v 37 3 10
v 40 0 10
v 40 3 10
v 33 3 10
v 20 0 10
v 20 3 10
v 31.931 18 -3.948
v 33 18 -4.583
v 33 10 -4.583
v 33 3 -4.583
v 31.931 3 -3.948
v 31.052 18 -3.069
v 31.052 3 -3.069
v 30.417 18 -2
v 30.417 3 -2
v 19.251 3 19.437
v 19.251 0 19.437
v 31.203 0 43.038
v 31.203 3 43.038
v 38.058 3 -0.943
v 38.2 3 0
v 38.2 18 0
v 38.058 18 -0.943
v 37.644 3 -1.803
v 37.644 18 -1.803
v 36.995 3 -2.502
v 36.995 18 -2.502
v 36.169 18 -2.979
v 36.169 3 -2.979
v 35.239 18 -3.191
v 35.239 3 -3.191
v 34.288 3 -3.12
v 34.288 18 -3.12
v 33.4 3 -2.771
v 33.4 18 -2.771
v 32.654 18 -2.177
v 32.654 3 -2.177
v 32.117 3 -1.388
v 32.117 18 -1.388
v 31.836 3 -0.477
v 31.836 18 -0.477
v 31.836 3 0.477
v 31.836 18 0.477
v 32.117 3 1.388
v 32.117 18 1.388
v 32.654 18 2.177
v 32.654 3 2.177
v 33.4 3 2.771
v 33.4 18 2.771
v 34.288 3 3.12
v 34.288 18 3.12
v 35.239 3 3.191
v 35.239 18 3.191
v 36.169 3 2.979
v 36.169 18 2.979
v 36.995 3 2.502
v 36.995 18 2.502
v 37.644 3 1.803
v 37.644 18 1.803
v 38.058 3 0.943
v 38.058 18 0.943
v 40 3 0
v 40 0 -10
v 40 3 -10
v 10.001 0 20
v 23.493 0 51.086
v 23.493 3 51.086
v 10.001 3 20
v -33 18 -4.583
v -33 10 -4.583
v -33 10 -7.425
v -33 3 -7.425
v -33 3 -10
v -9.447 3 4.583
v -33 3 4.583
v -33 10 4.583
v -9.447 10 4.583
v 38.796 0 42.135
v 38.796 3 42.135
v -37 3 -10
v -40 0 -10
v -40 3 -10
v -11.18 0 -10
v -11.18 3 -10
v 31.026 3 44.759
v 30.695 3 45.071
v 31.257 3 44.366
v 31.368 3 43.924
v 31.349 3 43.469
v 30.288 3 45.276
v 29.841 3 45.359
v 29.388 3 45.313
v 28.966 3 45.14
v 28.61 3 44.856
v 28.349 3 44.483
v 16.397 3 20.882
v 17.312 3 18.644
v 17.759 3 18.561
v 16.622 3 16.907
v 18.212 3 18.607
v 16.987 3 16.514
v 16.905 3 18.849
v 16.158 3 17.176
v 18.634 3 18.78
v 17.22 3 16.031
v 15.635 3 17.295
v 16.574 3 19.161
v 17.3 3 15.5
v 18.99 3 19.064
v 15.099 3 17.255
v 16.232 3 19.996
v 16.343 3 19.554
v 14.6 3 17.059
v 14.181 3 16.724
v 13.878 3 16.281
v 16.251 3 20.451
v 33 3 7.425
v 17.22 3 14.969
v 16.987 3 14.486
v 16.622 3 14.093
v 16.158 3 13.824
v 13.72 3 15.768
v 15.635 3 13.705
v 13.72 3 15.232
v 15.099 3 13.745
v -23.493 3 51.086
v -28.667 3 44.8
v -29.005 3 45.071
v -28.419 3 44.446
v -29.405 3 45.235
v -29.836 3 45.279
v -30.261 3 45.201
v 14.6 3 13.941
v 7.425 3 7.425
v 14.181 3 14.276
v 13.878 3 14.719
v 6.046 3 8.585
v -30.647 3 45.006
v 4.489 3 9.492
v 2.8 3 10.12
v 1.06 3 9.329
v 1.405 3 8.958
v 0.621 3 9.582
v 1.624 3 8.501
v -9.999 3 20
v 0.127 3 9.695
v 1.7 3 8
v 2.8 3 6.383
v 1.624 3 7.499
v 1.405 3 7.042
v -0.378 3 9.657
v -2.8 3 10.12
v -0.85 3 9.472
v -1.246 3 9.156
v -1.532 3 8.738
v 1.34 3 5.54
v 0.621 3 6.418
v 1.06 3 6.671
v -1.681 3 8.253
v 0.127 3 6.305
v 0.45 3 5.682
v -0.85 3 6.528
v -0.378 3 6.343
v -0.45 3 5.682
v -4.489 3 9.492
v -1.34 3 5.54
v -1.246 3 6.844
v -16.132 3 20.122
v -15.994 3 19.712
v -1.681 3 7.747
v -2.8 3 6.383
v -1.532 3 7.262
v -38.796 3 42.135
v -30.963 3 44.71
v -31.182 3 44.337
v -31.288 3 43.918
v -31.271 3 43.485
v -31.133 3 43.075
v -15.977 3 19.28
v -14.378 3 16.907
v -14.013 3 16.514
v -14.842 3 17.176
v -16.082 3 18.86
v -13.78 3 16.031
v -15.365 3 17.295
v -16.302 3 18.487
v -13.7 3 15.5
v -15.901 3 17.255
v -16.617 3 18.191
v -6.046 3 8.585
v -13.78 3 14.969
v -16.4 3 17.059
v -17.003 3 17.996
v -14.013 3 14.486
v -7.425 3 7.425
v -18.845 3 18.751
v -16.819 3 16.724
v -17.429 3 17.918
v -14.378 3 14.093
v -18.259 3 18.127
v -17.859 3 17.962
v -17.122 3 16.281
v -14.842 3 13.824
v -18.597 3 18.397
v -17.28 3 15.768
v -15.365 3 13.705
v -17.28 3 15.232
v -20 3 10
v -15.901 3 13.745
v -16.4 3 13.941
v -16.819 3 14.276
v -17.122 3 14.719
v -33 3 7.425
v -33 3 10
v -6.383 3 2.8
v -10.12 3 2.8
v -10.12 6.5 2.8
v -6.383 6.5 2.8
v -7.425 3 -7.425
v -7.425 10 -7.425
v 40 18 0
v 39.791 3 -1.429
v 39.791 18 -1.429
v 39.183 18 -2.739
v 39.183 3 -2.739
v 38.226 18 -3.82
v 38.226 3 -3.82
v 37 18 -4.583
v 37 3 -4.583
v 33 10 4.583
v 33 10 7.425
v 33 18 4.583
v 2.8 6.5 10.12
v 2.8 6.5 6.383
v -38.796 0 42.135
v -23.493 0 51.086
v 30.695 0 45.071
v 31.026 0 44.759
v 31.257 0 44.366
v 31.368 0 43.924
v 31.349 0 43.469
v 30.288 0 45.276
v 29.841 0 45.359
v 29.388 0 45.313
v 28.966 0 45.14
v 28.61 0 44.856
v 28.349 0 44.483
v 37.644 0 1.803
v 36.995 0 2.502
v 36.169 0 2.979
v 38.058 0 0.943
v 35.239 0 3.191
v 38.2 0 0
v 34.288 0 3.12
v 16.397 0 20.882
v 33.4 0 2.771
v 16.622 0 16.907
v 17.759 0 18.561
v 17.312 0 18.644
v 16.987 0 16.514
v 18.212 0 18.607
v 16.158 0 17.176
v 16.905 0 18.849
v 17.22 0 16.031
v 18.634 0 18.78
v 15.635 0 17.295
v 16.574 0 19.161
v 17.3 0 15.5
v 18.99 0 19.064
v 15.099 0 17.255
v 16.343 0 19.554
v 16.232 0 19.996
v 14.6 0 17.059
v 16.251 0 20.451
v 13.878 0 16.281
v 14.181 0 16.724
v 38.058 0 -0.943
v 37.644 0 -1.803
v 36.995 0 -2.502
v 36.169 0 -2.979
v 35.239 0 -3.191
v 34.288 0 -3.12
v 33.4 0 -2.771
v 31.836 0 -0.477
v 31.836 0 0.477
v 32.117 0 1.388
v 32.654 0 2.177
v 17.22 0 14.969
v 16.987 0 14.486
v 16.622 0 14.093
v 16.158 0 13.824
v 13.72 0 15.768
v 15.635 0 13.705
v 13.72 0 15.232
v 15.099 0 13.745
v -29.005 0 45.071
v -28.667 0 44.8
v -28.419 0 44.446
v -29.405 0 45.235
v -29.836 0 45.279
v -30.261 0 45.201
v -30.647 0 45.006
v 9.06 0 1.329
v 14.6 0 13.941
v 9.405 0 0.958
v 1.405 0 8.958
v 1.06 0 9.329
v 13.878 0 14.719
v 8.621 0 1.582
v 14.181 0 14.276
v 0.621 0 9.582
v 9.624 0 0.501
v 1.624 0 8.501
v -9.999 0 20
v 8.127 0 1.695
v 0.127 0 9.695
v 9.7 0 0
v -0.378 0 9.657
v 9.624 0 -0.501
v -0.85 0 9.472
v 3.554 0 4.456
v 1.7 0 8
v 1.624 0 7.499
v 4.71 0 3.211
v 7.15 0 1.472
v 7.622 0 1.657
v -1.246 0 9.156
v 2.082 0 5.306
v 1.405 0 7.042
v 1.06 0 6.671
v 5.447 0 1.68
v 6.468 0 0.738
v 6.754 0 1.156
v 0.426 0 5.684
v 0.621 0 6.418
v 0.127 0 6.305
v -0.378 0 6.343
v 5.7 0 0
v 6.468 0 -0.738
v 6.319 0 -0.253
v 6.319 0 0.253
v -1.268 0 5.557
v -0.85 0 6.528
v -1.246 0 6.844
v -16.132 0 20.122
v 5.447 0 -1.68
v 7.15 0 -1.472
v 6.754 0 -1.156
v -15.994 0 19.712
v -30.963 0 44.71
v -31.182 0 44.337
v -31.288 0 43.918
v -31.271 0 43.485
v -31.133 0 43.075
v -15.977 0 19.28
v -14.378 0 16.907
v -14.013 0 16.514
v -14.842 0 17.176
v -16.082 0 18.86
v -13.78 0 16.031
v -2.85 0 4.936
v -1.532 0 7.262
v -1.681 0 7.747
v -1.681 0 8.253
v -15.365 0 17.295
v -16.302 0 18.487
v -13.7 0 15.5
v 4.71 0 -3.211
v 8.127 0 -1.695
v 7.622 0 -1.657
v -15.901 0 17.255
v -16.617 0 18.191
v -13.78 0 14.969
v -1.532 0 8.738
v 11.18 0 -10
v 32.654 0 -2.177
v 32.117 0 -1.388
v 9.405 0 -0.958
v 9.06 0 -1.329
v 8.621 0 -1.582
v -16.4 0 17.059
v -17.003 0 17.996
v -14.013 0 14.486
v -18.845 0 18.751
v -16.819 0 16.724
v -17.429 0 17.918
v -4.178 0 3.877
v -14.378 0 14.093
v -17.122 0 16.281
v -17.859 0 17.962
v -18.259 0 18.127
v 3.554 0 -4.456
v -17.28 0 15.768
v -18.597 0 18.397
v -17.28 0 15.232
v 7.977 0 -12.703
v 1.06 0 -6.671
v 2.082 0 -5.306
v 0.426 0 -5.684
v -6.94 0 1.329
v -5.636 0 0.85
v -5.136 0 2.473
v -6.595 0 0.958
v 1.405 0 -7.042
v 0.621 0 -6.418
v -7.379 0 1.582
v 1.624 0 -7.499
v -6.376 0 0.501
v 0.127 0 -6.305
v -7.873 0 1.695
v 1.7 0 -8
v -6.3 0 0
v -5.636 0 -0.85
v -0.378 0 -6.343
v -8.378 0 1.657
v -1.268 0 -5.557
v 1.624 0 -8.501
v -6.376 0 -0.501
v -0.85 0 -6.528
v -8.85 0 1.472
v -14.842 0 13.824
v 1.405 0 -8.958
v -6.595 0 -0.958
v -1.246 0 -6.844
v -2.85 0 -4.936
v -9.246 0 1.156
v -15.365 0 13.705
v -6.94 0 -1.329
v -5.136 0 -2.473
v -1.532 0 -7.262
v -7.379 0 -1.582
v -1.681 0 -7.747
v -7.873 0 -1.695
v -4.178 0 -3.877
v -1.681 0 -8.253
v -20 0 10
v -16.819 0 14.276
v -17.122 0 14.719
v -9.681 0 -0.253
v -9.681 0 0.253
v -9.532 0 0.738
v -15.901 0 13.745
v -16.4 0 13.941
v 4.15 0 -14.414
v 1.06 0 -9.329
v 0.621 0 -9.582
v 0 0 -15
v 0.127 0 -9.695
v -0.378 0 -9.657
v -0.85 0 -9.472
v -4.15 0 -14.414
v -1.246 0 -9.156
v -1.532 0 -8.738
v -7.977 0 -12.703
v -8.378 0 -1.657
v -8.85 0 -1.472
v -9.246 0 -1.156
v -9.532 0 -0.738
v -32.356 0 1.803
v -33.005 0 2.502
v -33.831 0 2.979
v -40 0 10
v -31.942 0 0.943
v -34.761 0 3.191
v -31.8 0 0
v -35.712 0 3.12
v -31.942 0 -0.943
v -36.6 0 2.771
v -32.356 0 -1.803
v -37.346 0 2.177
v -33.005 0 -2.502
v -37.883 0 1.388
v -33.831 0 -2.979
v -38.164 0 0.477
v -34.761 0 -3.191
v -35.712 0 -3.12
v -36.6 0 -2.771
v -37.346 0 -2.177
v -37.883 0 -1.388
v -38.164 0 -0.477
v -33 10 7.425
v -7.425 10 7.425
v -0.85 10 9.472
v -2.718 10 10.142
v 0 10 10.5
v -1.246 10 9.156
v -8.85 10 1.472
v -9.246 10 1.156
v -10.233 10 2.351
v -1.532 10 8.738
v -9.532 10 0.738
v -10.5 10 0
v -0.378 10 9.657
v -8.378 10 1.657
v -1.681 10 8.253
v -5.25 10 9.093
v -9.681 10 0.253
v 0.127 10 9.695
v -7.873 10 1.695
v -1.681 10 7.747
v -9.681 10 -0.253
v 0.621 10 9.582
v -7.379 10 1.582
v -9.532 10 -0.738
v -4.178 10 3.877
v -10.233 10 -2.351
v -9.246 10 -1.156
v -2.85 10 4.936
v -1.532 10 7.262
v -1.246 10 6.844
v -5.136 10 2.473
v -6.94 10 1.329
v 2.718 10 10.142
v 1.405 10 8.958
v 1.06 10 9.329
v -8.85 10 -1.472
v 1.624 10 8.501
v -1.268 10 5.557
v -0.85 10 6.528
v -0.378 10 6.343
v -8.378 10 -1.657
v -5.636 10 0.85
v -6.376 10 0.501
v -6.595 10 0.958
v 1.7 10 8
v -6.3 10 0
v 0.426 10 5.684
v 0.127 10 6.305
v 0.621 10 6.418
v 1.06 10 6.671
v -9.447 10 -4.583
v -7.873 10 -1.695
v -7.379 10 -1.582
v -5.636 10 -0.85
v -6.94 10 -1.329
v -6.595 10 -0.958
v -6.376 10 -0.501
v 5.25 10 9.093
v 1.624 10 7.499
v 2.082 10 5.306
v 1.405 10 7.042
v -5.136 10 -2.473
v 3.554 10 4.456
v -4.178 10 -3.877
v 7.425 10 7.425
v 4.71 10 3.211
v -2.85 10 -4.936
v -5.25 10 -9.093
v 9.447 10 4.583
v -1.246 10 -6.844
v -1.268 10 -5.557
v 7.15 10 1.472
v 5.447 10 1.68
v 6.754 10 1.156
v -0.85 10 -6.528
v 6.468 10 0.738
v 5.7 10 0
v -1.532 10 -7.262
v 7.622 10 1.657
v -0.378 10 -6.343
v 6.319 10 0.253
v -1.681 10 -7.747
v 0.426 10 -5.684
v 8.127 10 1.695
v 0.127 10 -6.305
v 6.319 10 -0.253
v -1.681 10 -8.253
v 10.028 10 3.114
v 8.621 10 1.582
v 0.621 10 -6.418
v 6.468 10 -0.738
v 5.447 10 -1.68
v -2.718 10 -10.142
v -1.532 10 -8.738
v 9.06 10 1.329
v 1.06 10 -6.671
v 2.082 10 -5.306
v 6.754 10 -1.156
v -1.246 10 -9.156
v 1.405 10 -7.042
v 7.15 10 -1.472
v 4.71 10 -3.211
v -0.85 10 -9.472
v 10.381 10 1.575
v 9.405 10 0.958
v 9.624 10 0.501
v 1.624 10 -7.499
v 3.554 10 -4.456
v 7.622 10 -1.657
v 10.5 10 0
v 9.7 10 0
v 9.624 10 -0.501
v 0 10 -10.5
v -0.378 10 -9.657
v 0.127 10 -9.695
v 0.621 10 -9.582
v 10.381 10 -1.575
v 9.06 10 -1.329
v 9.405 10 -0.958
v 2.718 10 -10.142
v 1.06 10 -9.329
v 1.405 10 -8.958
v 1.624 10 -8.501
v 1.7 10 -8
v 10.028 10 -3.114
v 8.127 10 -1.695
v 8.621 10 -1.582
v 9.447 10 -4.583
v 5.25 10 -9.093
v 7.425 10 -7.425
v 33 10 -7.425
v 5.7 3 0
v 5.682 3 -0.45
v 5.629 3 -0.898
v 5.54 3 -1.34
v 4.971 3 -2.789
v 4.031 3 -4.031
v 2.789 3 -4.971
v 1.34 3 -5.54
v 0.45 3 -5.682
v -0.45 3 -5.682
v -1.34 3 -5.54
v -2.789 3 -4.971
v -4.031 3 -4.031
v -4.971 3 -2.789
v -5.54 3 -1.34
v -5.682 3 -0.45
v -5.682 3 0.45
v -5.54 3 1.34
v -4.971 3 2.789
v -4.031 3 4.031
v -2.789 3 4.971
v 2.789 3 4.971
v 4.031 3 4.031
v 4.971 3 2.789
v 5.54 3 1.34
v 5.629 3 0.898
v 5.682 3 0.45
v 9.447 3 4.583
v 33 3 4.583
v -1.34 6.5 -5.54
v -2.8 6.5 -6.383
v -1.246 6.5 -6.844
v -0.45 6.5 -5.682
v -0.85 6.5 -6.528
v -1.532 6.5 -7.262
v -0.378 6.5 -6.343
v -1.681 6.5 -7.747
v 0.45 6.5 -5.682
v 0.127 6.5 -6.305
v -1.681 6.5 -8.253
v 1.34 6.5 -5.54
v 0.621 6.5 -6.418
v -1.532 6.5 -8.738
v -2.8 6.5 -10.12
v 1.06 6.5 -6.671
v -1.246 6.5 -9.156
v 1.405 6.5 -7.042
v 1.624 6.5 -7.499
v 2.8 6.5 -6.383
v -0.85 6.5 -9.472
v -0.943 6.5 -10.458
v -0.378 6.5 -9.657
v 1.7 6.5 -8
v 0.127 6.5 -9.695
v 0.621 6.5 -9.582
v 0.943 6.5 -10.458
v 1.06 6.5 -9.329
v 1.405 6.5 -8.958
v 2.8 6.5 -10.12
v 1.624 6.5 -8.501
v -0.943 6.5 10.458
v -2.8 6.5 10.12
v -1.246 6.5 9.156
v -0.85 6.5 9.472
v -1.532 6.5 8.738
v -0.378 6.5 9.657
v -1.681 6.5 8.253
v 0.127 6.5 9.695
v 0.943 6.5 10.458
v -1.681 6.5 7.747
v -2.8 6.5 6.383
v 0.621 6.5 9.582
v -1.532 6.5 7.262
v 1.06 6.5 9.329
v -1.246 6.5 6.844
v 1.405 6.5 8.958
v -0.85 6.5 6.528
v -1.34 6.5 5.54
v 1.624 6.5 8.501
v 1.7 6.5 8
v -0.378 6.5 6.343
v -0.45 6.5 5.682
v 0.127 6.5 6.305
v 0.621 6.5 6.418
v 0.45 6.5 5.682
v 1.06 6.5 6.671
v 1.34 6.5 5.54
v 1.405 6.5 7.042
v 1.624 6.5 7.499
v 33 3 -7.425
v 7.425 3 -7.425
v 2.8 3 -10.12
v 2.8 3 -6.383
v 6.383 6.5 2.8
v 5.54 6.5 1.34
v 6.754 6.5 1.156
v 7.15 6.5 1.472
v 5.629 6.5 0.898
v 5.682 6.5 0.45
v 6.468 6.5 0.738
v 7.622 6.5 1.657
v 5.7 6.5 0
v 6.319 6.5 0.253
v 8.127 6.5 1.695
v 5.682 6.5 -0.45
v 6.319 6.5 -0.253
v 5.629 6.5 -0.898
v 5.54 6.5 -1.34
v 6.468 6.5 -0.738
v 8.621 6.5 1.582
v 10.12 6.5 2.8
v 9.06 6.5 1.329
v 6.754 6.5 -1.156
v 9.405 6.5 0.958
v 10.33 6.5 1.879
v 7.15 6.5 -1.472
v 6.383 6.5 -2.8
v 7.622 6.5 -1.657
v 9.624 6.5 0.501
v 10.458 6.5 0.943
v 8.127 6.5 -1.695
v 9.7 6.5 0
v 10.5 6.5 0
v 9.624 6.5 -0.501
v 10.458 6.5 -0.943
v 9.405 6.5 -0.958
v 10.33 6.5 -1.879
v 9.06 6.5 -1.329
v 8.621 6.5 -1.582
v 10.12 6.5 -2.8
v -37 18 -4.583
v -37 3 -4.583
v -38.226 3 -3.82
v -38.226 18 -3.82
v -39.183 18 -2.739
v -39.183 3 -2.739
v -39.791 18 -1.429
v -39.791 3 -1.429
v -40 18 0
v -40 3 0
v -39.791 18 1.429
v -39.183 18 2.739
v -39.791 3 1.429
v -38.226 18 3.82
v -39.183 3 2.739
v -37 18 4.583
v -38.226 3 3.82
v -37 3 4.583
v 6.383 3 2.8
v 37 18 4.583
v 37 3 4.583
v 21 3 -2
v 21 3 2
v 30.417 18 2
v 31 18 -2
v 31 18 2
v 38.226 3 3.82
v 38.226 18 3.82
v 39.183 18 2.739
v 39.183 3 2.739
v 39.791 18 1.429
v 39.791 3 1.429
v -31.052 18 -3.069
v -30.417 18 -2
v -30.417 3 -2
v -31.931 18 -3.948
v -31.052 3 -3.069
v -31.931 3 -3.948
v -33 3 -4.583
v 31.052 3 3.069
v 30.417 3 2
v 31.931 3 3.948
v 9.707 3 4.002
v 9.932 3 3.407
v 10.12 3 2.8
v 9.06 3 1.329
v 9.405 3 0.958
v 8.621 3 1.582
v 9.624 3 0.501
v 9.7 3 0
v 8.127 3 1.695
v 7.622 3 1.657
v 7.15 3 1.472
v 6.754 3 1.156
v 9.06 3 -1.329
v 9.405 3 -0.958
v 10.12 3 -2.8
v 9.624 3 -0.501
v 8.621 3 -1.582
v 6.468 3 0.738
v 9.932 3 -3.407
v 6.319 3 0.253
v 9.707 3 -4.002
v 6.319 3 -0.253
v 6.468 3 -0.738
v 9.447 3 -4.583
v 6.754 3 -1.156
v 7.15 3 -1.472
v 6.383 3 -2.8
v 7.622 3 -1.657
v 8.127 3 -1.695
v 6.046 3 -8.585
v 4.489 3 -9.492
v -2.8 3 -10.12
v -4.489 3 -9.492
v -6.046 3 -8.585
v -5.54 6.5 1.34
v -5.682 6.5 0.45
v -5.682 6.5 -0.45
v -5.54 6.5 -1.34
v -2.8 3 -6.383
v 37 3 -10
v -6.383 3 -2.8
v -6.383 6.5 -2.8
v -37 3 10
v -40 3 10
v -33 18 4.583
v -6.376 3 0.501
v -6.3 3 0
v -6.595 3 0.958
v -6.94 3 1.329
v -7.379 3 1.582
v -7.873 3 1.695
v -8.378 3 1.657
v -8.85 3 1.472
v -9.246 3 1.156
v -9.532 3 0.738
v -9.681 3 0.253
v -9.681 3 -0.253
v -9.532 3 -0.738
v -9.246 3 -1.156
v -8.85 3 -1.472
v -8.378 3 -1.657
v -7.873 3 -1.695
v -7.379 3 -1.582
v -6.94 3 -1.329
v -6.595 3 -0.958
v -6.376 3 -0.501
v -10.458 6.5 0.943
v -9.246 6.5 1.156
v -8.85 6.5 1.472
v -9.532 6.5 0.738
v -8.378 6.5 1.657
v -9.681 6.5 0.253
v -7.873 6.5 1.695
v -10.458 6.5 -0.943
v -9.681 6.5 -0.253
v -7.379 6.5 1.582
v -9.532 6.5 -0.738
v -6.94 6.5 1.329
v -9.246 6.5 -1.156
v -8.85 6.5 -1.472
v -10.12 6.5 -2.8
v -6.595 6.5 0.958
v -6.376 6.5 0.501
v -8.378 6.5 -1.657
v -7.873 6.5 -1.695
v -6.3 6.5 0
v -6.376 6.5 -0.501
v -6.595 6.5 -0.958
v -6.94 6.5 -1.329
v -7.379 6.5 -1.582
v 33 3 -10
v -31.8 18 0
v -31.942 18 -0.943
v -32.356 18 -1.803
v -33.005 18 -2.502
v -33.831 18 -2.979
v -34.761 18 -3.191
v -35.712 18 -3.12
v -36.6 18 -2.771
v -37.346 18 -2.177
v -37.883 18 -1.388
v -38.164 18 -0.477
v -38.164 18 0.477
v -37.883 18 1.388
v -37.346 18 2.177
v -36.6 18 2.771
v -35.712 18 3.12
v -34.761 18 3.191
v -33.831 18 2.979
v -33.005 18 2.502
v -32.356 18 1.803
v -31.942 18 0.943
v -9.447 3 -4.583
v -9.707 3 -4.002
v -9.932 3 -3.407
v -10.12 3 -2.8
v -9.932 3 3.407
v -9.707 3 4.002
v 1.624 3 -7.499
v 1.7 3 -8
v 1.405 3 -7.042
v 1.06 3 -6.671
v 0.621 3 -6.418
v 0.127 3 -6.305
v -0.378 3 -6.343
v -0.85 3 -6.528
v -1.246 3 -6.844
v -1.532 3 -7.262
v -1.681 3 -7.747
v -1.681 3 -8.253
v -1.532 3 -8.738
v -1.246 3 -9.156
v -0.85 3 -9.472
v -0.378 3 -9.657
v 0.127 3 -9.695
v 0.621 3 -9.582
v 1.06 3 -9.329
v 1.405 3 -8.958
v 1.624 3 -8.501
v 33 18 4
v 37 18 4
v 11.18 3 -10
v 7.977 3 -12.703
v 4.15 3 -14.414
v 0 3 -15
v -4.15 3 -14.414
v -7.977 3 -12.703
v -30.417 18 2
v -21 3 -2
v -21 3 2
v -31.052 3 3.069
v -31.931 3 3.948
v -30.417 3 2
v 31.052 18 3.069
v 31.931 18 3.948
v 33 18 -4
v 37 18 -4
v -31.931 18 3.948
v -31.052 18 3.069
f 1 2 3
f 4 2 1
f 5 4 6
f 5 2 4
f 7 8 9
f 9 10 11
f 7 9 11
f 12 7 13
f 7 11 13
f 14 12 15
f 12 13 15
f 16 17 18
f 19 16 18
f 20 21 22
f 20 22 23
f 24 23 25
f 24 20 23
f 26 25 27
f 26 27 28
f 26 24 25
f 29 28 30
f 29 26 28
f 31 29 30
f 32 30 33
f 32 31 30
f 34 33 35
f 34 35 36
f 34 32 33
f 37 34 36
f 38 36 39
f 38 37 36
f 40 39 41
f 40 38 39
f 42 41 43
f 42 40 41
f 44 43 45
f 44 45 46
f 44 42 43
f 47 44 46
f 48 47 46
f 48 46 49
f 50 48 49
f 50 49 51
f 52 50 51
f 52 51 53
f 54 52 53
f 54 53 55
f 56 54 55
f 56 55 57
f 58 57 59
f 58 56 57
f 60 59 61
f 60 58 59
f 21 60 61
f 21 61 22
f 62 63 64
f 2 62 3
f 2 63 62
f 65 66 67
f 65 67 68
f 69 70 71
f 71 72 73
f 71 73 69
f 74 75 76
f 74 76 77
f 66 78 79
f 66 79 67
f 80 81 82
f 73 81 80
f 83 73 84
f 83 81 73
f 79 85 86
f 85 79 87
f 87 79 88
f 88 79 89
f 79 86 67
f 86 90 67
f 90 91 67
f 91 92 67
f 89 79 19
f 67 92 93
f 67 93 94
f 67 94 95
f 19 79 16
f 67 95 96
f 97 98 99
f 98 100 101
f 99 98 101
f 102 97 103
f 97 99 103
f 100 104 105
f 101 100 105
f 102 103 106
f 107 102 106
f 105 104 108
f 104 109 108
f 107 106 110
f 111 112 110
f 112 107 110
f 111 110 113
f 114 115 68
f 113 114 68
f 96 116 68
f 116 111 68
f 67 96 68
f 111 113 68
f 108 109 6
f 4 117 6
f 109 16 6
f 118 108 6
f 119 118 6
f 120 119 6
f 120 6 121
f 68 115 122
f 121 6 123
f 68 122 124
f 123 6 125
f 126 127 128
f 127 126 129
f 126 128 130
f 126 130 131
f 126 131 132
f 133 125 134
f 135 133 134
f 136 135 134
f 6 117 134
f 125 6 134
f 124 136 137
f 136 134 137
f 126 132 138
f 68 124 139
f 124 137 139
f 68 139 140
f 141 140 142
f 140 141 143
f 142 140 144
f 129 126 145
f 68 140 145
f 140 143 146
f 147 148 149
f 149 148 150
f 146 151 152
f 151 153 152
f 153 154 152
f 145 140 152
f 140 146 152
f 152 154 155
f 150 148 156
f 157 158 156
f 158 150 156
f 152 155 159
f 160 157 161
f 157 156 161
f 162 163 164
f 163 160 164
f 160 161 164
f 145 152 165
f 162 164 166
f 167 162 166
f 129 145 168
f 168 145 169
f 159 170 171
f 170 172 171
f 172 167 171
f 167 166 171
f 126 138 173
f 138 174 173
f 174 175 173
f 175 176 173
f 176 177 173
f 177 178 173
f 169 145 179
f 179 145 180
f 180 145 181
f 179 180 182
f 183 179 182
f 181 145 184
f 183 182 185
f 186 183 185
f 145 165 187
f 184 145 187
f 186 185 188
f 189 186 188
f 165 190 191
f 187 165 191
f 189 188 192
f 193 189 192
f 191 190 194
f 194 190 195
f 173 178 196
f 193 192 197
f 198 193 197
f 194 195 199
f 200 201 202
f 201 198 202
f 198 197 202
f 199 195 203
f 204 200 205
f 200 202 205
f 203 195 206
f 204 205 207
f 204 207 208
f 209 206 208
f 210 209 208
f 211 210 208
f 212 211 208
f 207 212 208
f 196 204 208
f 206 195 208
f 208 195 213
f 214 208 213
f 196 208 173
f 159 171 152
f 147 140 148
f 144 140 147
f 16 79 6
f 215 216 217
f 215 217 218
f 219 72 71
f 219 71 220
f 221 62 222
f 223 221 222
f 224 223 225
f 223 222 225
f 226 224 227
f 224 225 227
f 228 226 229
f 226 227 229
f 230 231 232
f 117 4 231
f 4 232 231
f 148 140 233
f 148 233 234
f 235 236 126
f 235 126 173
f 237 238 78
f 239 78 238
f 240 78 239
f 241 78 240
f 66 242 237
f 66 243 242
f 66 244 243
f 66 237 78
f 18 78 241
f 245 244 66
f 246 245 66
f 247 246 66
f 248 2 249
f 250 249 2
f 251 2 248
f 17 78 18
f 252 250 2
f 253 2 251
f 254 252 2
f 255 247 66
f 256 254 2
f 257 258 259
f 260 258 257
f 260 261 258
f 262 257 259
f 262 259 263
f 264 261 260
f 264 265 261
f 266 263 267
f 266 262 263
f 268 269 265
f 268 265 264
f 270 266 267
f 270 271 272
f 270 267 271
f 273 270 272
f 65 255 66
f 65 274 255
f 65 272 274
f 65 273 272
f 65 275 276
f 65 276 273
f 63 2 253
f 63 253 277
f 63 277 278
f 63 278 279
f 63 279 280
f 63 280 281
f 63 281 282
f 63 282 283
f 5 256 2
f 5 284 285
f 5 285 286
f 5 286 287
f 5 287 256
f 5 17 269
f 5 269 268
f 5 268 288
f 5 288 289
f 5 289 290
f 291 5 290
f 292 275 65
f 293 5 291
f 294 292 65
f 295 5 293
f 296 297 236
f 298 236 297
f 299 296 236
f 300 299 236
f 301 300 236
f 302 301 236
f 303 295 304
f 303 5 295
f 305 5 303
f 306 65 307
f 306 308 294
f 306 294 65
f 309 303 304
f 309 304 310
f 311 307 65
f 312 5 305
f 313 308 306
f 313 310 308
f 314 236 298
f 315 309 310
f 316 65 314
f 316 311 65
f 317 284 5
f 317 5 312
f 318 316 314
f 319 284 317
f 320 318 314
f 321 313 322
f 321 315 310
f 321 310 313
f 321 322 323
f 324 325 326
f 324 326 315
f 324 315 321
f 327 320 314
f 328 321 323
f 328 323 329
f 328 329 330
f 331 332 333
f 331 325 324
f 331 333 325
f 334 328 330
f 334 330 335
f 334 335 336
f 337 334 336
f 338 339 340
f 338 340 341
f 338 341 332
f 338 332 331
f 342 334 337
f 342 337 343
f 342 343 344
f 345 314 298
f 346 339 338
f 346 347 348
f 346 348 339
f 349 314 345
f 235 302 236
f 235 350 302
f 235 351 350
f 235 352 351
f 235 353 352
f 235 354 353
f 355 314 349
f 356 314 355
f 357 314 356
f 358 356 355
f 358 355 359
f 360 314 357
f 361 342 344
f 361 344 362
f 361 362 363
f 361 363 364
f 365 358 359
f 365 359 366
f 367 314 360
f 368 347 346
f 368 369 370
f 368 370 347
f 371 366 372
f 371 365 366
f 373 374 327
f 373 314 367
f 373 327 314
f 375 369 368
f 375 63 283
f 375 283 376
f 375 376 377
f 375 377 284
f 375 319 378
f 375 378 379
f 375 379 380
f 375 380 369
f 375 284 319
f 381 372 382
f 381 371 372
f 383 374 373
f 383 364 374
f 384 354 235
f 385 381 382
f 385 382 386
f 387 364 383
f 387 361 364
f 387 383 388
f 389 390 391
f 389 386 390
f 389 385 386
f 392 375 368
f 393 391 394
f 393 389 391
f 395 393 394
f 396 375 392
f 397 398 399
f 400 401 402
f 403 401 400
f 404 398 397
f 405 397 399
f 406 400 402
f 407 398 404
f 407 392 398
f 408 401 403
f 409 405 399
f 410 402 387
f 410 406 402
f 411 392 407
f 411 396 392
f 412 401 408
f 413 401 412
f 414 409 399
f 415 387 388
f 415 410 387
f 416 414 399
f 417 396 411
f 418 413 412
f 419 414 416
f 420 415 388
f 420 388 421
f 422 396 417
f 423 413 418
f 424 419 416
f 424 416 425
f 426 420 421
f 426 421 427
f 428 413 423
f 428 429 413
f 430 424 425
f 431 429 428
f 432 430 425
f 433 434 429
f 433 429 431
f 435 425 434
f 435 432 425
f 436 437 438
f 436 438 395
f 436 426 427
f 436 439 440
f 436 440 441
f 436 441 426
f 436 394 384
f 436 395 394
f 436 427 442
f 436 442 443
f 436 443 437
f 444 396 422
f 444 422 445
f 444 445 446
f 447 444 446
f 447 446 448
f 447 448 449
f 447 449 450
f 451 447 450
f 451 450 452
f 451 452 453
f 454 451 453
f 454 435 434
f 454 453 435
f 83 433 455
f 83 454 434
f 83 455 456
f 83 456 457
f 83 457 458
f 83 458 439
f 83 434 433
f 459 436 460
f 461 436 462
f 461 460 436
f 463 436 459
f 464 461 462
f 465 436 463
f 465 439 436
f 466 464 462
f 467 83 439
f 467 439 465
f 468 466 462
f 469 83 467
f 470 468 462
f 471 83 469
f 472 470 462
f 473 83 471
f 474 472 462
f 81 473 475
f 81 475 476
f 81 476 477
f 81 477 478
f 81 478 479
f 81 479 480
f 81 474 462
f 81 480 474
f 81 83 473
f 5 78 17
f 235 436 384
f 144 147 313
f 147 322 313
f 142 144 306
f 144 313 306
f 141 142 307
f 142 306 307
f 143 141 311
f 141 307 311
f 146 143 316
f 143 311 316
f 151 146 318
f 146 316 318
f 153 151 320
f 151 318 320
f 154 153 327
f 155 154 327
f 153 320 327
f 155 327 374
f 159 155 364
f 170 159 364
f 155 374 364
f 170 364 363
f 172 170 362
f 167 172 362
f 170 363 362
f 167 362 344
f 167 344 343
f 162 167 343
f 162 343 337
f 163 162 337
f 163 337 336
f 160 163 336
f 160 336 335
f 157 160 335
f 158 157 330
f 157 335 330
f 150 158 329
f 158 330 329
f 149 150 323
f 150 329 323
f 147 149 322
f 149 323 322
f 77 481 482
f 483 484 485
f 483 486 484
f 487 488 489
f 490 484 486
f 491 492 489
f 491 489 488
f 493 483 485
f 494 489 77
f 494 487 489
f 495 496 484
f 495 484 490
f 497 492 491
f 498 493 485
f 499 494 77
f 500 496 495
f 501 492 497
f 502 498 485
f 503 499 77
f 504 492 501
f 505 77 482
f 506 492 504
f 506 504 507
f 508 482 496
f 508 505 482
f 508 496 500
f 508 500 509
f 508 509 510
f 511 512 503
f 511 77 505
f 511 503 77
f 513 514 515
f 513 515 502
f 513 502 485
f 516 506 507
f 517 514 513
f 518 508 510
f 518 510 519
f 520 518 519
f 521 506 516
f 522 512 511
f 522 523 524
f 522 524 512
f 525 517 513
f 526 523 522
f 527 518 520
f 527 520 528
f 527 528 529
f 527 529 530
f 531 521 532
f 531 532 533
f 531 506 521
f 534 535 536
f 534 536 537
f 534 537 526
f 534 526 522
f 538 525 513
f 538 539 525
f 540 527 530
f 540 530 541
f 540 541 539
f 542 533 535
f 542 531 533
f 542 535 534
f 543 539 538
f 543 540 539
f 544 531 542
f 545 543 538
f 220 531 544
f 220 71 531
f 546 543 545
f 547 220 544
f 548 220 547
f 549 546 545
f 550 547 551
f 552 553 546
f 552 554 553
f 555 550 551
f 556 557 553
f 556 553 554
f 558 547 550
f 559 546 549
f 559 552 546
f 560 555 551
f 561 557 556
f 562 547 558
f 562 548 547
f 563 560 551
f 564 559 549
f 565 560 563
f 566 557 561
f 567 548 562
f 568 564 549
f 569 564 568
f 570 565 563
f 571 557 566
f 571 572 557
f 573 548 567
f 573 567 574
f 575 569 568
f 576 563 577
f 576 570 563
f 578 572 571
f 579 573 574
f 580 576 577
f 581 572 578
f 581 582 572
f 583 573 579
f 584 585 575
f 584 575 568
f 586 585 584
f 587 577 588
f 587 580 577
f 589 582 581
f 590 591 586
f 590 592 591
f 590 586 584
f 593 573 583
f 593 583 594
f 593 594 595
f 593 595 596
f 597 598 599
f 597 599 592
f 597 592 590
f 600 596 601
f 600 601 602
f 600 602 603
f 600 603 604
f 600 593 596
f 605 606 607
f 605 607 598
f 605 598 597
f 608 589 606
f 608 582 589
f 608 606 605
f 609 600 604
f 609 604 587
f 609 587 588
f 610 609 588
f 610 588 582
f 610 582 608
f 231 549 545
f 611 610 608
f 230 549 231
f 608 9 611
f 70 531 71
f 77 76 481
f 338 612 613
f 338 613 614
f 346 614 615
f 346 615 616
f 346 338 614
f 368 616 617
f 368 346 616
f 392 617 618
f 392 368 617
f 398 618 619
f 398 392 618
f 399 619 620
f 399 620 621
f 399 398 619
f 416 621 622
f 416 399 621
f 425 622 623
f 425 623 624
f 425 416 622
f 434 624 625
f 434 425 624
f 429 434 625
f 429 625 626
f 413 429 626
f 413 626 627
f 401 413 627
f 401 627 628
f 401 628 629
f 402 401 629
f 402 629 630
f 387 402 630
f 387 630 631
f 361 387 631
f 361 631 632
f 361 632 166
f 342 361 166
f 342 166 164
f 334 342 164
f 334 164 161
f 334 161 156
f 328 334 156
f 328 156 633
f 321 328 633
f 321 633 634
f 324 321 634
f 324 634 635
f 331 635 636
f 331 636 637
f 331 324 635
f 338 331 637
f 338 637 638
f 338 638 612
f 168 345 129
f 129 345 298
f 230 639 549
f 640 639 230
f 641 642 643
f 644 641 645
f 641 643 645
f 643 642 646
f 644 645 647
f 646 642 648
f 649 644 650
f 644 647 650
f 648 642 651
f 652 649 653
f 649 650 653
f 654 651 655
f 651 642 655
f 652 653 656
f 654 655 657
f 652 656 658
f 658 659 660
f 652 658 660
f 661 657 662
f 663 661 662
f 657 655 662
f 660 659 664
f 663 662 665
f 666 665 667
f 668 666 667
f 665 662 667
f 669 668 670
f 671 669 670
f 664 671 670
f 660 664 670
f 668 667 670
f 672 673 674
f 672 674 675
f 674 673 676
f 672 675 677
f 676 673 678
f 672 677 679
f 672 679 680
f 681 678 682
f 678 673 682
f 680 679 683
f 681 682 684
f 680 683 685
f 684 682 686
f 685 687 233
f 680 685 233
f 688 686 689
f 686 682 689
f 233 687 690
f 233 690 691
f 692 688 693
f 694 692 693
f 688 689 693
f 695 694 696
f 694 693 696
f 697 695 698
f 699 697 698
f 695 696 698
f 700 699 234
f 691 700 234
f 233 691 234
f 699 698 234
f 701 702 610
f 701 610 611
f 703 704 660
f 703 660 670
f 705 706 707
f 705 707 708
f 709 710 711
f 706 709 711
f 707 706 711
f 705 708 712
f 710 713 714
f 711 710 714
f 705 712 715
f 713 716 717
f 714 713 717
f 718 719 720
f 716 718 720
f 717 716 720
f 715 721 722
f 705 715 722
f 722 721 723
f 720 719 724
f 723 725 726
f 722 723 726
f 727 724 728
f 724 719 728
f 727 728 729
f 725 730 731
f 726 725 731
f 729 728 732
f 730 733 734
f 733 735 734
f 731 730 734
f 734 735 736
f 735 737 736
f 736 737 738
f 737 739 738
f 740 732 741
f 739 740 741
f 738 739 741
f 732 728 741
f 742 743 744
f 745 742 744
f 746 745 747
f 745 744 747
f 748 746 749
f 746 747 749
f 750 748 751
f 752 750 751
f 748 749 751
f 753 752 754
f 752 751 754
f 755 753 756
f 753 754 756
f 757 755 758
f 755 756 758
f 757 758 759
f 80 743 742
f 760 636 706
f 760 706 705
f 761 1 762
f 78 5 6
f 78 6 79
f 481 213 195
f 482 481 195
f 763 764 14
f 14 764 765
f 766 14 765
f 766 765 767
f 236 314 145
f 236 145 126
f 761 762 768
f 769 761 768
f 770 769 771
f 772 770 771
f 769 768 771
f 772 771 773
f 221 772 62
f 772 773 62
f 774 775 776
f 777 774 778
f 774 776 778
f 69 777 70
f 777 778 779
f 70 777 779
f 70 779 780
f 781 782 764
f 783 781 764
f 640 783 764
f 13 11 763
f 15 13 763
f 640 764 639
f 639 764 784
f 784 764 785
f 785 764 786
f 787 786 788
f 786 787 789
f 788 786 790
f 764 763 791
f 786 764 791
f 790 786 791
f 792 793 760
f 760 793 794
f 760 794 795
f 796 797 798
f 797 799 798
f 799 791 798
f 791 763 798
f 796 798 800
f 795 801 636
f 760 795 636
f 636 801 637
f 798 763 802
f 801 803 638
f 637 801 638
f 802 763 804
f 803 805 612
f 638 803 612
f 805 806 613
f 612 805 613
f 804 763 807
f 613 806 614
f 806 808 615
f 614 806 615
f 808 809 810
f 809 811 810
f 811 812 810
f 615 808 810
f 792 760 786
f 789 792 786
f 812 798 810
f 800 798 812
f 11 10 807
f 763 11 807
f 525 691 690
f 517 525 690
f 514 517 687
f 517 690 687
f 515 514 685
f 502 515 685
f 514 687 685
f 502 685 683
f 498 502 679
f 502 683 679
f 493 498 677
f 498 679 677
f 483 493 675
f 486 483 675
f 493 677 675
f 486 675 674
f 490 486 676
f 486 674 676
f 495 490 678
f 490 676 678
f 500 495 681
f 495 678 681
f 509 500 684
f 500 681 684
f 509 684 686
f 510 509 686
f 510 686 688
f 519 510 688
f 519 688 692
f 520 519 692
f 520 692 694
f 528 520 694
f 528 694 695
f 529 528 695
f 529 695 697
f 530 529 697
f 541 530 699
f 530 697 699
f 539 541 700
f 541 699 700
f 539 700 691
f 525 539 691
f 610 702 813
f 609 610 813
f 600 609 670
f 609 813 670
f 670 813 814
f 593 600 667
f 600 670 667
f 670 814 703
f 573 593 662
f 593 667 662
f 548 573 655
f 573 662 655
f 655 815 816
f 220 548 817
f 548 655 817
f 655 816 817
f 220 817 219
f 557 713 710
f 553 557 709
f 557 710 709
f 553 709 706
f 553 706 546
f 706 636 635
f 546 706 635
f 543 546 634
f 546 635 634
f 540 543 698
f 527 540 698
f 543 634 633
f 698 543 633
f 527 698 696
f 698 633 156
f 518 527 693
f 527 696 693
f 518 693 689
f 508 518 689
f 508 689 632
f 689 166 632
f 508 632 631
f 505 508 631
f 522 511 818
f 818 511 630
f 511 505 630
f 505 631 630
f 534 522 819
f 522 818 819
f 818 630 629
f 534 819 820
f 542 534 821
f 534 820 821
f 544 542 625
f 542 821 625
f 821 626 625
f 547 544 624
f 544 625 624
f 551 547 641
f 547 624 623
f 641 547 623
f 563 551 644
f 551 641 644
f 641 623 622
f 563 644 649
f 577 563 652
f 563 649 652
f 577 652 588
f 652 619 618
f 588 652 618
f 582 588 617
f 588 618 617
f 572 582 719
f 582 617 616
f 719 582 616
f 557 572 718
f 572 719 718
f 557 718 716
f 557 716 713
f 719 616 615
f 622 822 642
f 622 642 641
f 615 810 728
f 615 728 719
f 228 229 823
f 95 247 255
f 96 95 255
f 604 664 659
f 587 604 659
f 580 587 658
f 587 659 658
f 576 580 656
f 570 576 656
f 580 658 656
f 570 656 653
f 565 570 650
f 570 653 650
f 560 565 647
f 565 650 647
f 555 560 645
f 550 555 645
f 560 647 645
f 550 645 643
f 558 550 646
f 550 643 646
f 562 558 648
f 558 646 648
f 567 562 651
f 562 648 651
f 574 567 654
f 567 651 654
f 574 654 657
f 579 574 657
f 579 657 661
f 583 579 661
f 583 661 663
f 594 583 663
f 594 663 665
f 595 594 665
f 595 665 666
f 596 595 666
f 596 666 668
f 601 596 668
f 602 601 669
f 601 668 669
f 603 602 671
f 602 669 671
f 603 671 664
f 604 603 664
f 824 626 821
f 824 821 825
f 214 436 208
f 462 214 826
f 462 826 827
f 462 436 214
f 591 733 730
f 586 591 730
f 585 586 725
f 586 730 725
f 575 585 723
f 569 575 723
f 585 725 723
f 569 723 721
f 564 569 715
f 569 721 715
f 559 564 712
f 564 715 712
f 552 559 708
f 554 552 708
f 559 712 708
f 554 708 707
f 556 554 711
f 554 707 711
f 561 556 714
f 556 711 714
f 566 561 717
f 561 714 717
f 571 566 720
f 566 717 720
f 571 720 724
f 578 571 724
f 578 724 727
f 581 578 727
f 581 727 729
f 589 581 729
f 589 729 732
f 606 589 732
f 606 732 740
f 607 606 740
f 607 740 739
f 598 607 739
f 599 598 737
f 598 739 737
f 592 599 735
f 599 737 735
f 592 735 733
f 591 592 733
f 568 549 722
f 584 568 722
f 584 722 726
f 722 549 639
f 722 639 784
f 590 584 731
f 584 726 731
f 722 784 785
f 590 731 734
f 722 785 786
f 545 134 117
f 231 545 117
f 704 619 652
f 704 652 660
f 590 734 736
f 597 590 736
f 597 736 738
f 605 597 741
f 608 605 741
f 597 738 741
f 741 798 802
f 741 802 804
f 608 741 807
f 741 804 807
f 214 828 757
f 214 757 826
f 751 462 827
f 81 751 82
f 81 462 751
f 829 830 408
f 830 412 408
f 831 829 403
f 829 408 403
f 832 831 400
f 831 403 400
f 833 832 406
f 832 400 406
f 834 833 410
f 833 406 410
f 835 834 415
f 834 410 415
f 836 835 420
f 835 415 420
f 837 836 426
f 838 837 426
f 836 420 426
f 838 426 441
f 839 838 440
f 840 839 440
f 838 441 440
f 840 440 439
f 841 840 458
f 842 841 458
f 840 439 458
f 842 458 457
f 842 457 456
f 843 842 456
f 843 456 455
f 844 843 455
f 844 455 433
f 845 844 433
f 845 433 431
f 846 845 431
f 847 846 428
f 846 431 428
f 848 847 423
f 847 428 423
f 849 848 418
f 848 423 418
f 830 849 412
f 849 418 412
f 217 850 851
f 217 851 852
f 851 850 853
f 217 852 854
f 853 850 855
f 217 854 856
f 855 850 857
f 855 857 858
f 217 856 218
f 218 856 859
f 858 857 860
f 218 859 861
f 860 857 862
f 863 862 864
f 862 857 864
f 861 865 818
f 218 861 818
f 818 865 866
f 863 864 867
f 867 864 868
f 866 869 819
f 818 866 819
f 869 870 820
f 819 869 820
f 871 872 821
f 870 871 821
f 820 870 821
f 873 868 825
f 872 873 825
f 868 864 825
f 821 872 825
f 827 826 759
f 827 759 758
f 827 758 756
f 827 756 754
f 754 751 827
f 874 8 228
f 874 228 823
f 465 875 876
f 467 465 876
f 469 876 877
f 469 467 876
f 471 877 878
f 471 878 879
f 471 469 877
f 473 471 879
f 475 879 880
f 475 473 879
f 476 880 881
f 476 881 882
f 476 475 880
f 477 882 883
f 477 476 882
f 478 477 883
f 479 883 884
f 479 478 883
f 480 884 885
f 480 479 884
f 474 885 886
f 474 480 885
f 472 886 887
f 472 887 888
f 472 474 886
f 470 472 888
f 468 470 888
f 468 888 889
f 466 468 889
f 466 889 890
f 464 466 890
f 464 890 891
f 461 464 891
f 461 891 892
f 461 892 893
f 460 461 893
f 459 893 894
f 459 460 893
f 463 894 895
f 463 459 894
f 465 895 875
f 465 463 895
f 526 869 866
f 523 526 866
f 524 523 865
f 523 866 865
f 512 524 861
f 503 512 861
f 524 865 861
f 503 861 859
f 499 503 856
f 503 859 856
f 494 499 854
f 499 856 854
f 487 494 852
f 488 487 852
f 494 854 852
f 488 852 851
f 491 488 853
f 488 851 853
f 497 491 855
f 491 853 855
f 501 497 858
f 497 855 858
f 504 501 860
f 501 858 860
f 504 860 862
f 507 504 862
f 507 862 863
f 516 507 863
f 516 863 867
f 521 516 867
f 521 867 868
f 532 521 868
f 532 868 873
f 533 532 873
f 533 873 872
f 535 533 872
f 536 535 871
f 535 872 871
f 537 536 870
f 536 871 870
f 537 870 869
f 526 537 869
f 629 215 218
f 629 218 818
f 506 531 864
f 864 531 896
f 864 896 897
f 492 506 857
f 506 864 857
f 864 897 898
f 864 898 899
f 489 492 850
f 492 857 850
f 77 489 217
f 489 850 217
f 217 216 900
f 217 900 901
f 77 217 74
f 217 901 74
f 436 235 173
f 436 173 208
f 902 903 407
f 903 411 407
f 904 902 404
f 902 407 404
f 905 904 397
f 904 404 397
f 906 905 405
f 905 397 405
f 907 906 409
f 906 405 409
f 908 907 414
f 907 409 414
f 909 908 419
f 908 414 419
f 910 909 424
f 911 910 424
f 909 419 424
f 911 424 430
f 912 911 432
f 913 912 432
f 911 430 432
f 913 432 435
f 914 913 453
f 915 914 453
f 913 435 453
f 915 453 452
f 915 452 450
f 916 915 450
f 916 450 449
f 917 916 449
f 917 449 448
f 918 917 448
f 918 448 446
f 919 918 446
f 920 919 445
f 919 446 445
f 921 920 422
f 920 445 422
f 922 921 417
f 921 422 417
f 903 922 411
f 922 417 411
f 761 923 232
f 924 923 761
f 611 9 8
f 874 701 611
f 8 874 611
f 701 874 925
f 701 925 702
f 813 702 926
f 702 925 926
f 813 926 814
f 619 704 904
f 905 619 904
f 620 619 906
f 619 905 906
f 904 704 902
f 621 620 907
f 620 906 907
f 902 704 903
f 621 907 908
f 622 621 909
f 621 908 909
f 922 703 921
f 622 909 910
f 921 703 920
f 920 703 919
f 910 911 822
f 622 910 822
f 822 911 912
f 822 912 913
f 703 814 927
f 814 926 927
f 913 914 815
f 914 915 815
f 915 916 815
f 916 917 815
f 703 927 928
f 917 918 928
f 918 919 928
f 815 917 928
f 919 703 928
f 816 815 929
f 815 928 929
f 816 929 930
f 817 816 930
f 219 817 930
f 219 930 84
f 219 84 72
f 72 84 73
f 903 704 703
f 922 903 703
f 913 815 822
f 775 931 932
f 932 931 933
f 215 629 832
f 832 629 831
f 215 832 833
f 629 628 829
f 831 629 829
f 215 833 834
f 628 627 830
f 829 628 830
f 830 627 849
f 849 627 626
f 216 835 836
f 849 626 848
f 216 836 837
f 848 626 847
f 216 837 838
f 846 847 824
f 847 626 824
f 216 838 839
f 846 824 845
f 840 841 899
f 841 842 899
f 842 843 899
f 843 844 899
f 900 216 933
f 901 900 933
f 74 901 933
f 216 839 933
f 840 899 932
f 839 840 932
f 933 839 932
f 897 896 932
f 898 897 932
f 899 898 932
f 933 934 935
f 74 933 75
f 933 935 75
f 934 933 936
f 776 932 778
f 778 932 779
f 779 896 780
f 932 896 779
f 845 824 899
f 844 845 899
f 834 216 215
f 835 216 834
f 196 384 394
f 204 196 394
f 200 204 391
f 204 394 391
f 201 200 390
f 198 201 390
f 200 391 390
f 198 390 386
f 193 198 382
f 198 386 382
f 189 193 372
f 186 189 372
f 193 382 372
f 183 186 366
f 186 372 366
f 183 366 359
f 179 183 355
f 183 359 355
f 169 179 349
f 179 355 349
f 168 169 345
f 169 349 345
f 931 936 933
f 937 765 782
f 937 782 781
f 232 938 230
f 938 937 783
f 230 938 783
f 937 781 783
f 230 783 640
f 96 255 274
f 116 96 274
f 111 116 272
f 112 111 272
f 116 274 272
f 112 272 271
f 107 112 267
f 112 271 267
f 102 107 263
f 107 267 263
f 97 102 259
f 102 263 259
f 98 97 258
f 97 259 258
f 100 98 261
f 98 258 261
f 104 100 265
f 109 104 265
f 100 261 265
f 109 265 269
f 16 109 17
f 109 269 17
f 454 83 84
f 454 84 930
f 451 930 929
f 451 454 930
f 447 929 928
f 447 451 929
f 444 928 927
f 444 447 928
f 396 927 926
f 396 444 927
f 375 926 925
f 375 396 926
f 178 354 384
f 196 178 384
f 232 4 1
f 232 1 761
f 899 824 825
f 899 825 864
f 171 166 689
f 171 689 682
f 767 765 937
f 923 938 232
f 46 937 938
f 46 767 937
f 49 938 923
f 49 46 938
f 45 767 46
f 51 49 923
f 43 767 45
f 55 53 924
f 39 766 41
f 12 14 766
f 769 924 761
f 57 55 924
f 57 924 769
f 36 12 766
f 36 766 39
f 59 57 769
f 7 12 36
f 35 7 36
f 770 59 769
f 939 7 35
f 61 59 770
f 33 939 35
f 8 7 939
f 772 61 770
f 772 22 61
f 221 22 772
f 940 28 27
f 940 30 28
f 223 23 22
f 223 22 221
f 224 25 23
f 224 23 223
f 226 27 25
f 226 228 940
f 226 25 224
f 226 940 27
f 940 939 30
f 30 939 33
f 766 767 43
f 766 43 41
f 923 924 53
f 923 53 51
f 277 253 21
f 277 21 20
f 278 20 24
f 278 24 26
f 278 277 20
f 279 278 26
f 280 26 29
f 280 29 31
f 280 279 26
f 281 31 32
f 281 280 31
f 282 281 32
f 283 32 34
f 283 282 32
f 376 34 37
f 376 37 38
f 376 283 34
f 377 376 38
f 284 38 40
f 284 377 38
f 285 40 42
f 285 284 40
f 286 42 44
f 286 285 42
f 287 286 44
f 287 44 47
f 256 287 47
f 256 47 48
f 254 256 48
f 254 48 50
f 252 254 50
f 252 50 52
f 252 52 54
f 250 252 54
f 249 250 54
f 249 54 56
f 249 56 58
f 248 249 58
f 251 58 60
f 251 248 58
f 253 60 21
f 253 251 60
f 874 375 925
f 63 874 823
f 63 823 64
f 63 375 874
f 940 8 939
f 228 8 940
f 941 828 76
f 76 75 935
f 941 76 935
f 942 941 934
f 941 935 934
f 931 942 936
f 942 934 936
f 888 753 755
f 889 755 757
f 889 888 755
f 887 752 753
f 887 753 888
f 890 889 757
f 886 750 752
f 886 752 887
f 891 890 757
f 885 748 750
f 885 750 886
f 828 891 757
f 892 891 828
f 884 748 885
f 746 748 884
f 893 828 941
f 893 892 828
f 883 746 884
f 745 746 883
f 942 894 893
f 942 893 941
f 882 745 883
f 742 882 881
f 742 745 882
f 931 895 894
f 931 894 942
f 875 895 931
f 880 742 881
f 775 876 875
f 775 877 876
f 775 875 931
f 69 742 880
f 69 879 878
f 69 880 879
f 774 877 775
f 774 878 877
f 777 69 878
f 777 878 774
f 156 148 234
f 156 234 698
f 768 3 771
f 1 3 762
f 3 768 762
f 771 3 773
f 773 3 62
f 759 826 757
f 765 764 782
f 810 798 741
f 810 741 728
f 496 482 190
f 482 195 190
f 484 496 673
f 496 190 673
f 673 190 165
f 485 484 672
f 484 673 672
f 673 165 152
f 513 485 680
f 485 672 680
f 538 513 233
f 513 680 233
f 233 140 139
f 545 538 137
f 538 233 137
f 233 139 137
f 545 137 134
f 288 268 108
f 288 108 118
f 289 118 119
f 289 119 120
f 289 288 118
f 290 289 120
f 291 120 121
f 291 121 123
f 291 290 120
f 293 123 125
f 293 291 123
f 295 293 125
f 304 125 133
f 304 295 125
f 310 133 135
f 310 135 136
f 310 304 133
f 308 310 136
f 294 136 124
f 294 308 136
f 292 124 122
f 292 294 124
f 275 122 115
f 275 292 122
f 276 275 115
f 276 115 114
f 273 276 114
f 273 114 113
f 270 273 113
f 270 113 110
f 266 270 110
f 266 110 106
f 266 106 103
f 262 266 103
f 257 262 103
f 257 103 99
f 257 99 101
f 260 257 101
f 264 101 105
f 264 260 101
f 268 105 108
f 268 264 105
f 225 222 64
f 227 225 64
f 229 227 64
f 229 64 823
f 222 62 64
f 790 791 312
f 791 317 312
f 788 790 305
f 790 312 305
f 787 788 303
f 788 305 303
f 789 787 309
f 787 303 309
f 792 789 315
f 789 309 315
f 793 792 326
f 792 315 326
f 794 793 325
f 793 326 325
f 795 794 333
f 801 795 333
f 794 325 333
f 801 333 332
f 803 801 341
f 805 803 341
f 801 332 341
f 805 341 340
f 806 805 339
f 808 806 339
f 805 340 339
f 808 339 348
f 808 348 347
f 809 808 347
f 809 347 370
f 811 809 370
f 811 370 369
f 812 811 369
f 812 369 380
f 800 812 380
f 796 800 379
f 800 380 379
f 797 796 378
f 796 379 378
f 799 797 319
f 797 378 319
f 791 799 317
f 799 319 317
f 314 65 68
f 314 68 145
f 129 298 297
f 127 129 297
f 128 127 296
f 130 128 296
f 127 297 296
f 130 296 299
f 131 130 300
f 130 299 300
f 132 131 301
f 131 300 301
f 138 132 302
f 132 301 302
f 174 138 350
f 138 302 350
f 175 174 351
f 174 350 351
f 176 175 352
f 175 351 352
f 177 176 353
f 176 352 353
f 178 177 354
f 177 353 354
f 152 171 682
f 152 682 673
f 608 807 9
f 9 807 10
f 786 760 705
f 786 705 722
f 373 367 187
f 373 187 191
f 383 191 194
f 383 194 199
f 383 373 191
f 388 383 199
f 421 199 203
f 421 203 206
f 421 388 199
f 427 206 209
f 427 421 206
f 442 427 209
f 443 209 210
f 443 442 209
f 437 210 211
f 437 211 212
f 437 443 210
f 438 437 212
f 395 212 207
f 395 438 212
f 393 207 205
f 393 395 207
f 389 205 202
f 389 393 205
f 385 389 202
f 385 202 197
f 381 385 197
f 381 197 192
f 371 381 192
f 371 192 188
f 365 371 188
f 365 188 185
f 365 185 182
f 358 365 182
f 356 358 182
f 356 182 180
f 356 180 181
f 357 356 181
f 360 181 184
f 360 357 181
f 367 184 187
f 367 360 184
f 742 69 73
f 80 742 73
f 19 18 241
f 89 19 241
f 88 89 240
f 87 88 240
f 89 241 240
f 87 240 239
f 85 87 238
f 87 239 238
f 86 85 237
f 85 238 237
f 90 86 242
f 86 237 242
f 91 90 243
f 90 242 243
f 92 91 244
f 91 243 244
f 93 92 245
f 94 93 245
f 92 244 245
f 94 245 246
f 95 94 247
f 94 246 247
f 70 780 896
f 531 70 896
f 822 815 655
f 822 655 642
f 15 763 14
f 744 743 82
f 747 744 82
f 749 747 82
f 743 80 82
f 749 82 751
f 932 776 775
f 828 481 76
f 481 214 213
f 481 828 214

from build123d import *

# Parameters (mm, degrees)
SKETCH_1_R          = 3.2
SKETCH_1_R_2        = 1.8
SKETCH_1_R_3        = 5.7
SKETCH_1_R_4        = 1.7
EXTRUDE_1_DEPTH     = 3
SKETCH_2_R          = 10.5
EXTRUDE_2_DEPTH     = 7
SKETCH_4_R          = 1.7
CUT_EXTRUDE_1_DEPTH = 7
CUT_EXTRUDE_2_DEPTH = 3.5
SKETCH_6_R          = 5.7
CUT_EXTRUDE_3_DEPTH = 20
SKETCH_7_R          = 5
SKETCH_7_R_2        = 3.2
EXTRUDE_3_DEPTH     = 15
SKETCH_8_W          = 10
SKETCH_8_H          = 4
SKETCH_8_W_2        = 4
SKETCH_8_H_2        = 6
EXTRUDE_4_DEPTH     = 15
CUT_EXTRUDE_4_DEPTH = 15
CUT_EXTRUDE_5_DEPTH = 15
CUT_EXTRUDE_6_DEPTH = 15
SKETCH_12_W         = 25.575378798
SKETCH_12_H         = 2.842045507
EXTRUDE_5_DEPTH     = 7


with BuildPart() as part:
    # 草图1 → 凸台-拉伸1 (new body)
    with BuildSketch(Plane(origin=(0, 0, 0), x_dir=(1, 0, 0), z_dir=(0, 1, 0))):
        with BuildLine():
            Line((-35.081832586, -10), (-40, -10))
            Line((-40, -10), (-40, 10))
            Line((-40, 10), (-11.180339887, 10))
            ThreePointArc((-11.180339887, 10), (0, 15), (11.180339887, 10))
            Line((11.180339887, 10), (40, 10))
            Line((40, 10), (40, -10))
            Line((40, -10), (20, -10))
            Line((20, -10), (38.795982487, -42.134997854))
            Line((38.795982487, -42.134997854), (23.493176713, -51.085714784))
            Line((23.493176713, -51.085714784), (10.00055485, -20.000324527))
            Line((10.00055485, -20.000324527), (-9.99944515, -20.000324527))
            Line((-9.99944515, -20.000324527), (-23.493239928, -51.085714784))
            Line((-23.493239928, -51.085714784), (-38.79573581, -42.1354119))
            Line((-38.79573581, -42.1354119), (-20, -10))
            Line((-20, -10), (-35.081832586, -10))
        make_face()
        with Locations((35, 0)):
            Circle(SKETCH_1_R, mode=Mode.SUBTRACT)
        with Locations((-15.5, -15.5)):
            Circle(SKETCH_1_R_2, mode=Mode.SUBTRACT)
        with Locations((15.5, -15.5)):
            Circle(SKETCH_1_R_2, mode=Mode.SUBTRACT)
        with Locations((-35, 0)):
            Circle(SKETCH_1_R, mode=Mode.SUBTRACT)
        Circle(SKETCH_1_R_3, mode=Mode.SUBTRACT)
        with Locations((-8, 0)):
            Circle(SKETCH_1_R_4, mode=Mode.SUBTRACT)
        with Locations((0, 8)):
            Circle(SKETCH_1_R_4, mode=Mode.SUBTRACT)
        with Locations((8, 0)):
            Circle(SKETCH_1_R_4, mode=Mode.SUBTRACT)
        with Locations((0, -8)):
            Circle(SKETCH_1_R_4, mode=Mode.SUBTRACT)
        with BuildLine():
            Line((-16.131862345, -20.121977189), (-28.419219954, -44.445930008))
            ThreePointArc((-28.419219954, -44.445930008), (-30.461319047, -45.117305053), (-31.132694091, -43.07520596))
            Line((-31.132694091, -43.07520596), (-18.845336482, -18.75125314))
            ThreePointArc((-18.845336482, -18.75125314), (-16.803237389, -18.079878096), (-16.131862345, -20.121977189))
        make_face(mode=Mode.SUBTRACT)
        with BuildLine():
            Line((19.251434516, -19.436615165), (31.203359651, -43.037711333))
            ThreePointArc((31.203359651, -43.037711333), (30.498813674, -45.187970612), (28.348554395, -44.483424635))
            Line((28.348554395, -44.483424635), (16.39662926, -20.882328467))
            ThreePointArc((16.39662926, -20.882328467), (17.101175237, -18.732069188), (19.251434516, -19.436615165))
        make_face(mode=Mode.SUBTRACT)
    extrude(amount=EXTRUDE_1_DEPTH)

    # 草图2 → 凸台-拉伸2 (add)
    with BuildSketch(Plane(origin=(0, 3, 0), x_dir=(1, 0, 0), z_dir=(0, 1, 0))):
        Circle(SKETCH_2_R)
    extrude(amount=EXTRUDE_2_DEPTH)

    # 草图4 → 切除-拉伸1 (cut)
    with BuildSketch(Plane.XZ.offset(-3)):
        with Locations((0, -8)):
            Circle(SKETCH_4_R)
        with Locations((-8, 0)):
            Circle(SKETCH_4_R)
        with Locations((8, 0)):
            Circle(SKETCH_4_R)
        with Locations((0, 8)):
            Circle(SKETCH_4_R)
    extrude(amount=-CUT_EXTRUDE_1_DEPTH, mode=Mode.SUBTRACT)

    # 草图5 → 切除-拉伸2 (cut)
    with BuildSketch(Plane(origin=(0, 3, 0), x_dir=(1, 0, 0), z_dir=(0, 1, 0))):
        Polygon((-4.766838493, 0), (-6.383419246, 2.8), (-11.233161507, 2.8), (-11.233161507, -2.8), (-6.383419246, -2.8), align=None)
        Polygon((4.766838493, 0), (6.383419246, -2.8), (11.233161507, -2.8), (11.233161507, 2.8), (6.383419246, 2.8), align=None)
        Polygon((-2.8, 11.233161507), (-2.8, 6.383419246), (0, 4.766838493), (2.8, 6.383419246), (2.8, 11.233161507), align=None)
        Polygon((0, -4.766838493), (-2.8, -6.383419246), (-2.8, -11.233161507), (2.8, -11.233161507), (2.8, -6.383419246), align=None)
    extrude(amount=CUT_EXTRUDE_2_DEPTH, mode=Mode.SUBTRACT)

    # 草图6 → 切除-拉伸3 (cut)
    with BuildSketch(Plane.XZ.offset(-3)):
        Circle(SKETCH_6_R)
    extrude(amount=-CUT_EXTRUDE_3_DEPTH, mode=Mode.SUBTRACT)

    # 草图7 → 凸台-拉伸3 (add)
    with BuildSketch(Plane(origin=(0, 3, 0), x_dir=(1, 0, 0), z_dir=(0, 1, 0))):
        with Locations((-35, 0)):
            Circle(SKETCH_7_R)
        with Locations((-35, 0)):
            Circle(SKETCH_7_R_2, mode=Mode.SUBTRACT)
        with Locations((35, 0)):
            Circle(SKETCH_7_R)
        with Locations((35, 0)):
            Circle(SKETCH_7_R_2, mode=Mode.SUBTRACT)
    extrude(amount=EXTRUDE_3_DEPTH)

    # 草图8 → 凸台-拉伸4 (add)
    with BuildSketch(Plane(origin=(0, 3, 0), x_dir=(1, 0, 0), z_dir=(0, 1, 0))):
        with Locations((-26, 0)):
            Rectangle(SKETCH_8_W, SKETCH_8_H)
        with Locations((-35, 7)):
            Rectangle(SKETCH_8_W_2, SKETCH_8_H_2)
        with Locations((-35, -7)):
            Rectangle(SKETCH_8_W_2, SKETCH_8_H_2)
        with Locations((26, 0)):
            Rectangle(SKETCH_8_W, SKETCH_8_H)
        with Locations((35, 7)):
            Rectangle(SKETCH_8_W_2, SKETCH_8_H_2)
        with Locations((35, -7)):
            Rectangle(SKETCH_8_W_2, SKETCH_8_H_2)
    extrude(amount=EXTRUDE_4_DEPTH)

    # 草图9 → 切除-拉伸4 (cut)
    with BuildSketch(Plane.XY.offset(2)):
        Polygon((-30.417424305, 18), (-21, 3), (-21, 18), align=None)
        Polygon((21, 3), (30.417424305, 18), (21, 18), align=None)
    extrude(amount=-CUT_EXTRUDE_4_DEPTH, mode=Mode.SUBTRACT)

    # 草图10 → 切除-拉伸5 (cut)
    with BuildSketch(Plane.ZY.offset(-33)):
        Polygon((-4.582575695, 18), (-10, 3), (-10, 18), align=None)
        Polygon((4.582575695, 18), (10, 18), (10, 3), align=None)
    extrude(amount=-CUT_EXTRUDE_5_DEPTH, mode=Mode.SUBTRACT)

    # 草图11 → 切除-拉伸6 (cut)
    with BuildSketch(Plane(origin=(-33, 0, 0), x_dir=(0, 0, -1), z_dir=(1, 0, 0))):
        Polygon((-4.582575695, 18), (-10, 3), (-10, 18), align=None)
        Polygon((4.582575695, 18), (10, 3), (10, 18), align=None)
    extrude(amount=-CUT_EXTRUDE_6_DEPTH, mode=Mode.SUBTRACT)

    # 草图12 → 凸台-拉伸5 (add)
    with BuildSketch(Plane(origin=(0, 3, 0), x_dir=(1, 0, 0), z_dir=(0, 1, 0))):
        with Locations((-20.212310601, -6.003598449)):
            Rectangle(SKETCH_12_W, SKETCH_12_H)
        with Locations((-20.212310601, 6.003598449)):
            Rectangle(SKETCH_12_W, SKETCH_12_H)
        with Locations((20.212310601, 6.003598449)):
            Rectangle(SKETCH_12_W, SKETCH_12_H)
        with Locations((20.212310601, -6.003598449)):
            Rectangle(SKETCH_12_W, SKETCH_12_H)
    extrude(amount=EXTRUDE_5_DEPTH)


solid = part.part
